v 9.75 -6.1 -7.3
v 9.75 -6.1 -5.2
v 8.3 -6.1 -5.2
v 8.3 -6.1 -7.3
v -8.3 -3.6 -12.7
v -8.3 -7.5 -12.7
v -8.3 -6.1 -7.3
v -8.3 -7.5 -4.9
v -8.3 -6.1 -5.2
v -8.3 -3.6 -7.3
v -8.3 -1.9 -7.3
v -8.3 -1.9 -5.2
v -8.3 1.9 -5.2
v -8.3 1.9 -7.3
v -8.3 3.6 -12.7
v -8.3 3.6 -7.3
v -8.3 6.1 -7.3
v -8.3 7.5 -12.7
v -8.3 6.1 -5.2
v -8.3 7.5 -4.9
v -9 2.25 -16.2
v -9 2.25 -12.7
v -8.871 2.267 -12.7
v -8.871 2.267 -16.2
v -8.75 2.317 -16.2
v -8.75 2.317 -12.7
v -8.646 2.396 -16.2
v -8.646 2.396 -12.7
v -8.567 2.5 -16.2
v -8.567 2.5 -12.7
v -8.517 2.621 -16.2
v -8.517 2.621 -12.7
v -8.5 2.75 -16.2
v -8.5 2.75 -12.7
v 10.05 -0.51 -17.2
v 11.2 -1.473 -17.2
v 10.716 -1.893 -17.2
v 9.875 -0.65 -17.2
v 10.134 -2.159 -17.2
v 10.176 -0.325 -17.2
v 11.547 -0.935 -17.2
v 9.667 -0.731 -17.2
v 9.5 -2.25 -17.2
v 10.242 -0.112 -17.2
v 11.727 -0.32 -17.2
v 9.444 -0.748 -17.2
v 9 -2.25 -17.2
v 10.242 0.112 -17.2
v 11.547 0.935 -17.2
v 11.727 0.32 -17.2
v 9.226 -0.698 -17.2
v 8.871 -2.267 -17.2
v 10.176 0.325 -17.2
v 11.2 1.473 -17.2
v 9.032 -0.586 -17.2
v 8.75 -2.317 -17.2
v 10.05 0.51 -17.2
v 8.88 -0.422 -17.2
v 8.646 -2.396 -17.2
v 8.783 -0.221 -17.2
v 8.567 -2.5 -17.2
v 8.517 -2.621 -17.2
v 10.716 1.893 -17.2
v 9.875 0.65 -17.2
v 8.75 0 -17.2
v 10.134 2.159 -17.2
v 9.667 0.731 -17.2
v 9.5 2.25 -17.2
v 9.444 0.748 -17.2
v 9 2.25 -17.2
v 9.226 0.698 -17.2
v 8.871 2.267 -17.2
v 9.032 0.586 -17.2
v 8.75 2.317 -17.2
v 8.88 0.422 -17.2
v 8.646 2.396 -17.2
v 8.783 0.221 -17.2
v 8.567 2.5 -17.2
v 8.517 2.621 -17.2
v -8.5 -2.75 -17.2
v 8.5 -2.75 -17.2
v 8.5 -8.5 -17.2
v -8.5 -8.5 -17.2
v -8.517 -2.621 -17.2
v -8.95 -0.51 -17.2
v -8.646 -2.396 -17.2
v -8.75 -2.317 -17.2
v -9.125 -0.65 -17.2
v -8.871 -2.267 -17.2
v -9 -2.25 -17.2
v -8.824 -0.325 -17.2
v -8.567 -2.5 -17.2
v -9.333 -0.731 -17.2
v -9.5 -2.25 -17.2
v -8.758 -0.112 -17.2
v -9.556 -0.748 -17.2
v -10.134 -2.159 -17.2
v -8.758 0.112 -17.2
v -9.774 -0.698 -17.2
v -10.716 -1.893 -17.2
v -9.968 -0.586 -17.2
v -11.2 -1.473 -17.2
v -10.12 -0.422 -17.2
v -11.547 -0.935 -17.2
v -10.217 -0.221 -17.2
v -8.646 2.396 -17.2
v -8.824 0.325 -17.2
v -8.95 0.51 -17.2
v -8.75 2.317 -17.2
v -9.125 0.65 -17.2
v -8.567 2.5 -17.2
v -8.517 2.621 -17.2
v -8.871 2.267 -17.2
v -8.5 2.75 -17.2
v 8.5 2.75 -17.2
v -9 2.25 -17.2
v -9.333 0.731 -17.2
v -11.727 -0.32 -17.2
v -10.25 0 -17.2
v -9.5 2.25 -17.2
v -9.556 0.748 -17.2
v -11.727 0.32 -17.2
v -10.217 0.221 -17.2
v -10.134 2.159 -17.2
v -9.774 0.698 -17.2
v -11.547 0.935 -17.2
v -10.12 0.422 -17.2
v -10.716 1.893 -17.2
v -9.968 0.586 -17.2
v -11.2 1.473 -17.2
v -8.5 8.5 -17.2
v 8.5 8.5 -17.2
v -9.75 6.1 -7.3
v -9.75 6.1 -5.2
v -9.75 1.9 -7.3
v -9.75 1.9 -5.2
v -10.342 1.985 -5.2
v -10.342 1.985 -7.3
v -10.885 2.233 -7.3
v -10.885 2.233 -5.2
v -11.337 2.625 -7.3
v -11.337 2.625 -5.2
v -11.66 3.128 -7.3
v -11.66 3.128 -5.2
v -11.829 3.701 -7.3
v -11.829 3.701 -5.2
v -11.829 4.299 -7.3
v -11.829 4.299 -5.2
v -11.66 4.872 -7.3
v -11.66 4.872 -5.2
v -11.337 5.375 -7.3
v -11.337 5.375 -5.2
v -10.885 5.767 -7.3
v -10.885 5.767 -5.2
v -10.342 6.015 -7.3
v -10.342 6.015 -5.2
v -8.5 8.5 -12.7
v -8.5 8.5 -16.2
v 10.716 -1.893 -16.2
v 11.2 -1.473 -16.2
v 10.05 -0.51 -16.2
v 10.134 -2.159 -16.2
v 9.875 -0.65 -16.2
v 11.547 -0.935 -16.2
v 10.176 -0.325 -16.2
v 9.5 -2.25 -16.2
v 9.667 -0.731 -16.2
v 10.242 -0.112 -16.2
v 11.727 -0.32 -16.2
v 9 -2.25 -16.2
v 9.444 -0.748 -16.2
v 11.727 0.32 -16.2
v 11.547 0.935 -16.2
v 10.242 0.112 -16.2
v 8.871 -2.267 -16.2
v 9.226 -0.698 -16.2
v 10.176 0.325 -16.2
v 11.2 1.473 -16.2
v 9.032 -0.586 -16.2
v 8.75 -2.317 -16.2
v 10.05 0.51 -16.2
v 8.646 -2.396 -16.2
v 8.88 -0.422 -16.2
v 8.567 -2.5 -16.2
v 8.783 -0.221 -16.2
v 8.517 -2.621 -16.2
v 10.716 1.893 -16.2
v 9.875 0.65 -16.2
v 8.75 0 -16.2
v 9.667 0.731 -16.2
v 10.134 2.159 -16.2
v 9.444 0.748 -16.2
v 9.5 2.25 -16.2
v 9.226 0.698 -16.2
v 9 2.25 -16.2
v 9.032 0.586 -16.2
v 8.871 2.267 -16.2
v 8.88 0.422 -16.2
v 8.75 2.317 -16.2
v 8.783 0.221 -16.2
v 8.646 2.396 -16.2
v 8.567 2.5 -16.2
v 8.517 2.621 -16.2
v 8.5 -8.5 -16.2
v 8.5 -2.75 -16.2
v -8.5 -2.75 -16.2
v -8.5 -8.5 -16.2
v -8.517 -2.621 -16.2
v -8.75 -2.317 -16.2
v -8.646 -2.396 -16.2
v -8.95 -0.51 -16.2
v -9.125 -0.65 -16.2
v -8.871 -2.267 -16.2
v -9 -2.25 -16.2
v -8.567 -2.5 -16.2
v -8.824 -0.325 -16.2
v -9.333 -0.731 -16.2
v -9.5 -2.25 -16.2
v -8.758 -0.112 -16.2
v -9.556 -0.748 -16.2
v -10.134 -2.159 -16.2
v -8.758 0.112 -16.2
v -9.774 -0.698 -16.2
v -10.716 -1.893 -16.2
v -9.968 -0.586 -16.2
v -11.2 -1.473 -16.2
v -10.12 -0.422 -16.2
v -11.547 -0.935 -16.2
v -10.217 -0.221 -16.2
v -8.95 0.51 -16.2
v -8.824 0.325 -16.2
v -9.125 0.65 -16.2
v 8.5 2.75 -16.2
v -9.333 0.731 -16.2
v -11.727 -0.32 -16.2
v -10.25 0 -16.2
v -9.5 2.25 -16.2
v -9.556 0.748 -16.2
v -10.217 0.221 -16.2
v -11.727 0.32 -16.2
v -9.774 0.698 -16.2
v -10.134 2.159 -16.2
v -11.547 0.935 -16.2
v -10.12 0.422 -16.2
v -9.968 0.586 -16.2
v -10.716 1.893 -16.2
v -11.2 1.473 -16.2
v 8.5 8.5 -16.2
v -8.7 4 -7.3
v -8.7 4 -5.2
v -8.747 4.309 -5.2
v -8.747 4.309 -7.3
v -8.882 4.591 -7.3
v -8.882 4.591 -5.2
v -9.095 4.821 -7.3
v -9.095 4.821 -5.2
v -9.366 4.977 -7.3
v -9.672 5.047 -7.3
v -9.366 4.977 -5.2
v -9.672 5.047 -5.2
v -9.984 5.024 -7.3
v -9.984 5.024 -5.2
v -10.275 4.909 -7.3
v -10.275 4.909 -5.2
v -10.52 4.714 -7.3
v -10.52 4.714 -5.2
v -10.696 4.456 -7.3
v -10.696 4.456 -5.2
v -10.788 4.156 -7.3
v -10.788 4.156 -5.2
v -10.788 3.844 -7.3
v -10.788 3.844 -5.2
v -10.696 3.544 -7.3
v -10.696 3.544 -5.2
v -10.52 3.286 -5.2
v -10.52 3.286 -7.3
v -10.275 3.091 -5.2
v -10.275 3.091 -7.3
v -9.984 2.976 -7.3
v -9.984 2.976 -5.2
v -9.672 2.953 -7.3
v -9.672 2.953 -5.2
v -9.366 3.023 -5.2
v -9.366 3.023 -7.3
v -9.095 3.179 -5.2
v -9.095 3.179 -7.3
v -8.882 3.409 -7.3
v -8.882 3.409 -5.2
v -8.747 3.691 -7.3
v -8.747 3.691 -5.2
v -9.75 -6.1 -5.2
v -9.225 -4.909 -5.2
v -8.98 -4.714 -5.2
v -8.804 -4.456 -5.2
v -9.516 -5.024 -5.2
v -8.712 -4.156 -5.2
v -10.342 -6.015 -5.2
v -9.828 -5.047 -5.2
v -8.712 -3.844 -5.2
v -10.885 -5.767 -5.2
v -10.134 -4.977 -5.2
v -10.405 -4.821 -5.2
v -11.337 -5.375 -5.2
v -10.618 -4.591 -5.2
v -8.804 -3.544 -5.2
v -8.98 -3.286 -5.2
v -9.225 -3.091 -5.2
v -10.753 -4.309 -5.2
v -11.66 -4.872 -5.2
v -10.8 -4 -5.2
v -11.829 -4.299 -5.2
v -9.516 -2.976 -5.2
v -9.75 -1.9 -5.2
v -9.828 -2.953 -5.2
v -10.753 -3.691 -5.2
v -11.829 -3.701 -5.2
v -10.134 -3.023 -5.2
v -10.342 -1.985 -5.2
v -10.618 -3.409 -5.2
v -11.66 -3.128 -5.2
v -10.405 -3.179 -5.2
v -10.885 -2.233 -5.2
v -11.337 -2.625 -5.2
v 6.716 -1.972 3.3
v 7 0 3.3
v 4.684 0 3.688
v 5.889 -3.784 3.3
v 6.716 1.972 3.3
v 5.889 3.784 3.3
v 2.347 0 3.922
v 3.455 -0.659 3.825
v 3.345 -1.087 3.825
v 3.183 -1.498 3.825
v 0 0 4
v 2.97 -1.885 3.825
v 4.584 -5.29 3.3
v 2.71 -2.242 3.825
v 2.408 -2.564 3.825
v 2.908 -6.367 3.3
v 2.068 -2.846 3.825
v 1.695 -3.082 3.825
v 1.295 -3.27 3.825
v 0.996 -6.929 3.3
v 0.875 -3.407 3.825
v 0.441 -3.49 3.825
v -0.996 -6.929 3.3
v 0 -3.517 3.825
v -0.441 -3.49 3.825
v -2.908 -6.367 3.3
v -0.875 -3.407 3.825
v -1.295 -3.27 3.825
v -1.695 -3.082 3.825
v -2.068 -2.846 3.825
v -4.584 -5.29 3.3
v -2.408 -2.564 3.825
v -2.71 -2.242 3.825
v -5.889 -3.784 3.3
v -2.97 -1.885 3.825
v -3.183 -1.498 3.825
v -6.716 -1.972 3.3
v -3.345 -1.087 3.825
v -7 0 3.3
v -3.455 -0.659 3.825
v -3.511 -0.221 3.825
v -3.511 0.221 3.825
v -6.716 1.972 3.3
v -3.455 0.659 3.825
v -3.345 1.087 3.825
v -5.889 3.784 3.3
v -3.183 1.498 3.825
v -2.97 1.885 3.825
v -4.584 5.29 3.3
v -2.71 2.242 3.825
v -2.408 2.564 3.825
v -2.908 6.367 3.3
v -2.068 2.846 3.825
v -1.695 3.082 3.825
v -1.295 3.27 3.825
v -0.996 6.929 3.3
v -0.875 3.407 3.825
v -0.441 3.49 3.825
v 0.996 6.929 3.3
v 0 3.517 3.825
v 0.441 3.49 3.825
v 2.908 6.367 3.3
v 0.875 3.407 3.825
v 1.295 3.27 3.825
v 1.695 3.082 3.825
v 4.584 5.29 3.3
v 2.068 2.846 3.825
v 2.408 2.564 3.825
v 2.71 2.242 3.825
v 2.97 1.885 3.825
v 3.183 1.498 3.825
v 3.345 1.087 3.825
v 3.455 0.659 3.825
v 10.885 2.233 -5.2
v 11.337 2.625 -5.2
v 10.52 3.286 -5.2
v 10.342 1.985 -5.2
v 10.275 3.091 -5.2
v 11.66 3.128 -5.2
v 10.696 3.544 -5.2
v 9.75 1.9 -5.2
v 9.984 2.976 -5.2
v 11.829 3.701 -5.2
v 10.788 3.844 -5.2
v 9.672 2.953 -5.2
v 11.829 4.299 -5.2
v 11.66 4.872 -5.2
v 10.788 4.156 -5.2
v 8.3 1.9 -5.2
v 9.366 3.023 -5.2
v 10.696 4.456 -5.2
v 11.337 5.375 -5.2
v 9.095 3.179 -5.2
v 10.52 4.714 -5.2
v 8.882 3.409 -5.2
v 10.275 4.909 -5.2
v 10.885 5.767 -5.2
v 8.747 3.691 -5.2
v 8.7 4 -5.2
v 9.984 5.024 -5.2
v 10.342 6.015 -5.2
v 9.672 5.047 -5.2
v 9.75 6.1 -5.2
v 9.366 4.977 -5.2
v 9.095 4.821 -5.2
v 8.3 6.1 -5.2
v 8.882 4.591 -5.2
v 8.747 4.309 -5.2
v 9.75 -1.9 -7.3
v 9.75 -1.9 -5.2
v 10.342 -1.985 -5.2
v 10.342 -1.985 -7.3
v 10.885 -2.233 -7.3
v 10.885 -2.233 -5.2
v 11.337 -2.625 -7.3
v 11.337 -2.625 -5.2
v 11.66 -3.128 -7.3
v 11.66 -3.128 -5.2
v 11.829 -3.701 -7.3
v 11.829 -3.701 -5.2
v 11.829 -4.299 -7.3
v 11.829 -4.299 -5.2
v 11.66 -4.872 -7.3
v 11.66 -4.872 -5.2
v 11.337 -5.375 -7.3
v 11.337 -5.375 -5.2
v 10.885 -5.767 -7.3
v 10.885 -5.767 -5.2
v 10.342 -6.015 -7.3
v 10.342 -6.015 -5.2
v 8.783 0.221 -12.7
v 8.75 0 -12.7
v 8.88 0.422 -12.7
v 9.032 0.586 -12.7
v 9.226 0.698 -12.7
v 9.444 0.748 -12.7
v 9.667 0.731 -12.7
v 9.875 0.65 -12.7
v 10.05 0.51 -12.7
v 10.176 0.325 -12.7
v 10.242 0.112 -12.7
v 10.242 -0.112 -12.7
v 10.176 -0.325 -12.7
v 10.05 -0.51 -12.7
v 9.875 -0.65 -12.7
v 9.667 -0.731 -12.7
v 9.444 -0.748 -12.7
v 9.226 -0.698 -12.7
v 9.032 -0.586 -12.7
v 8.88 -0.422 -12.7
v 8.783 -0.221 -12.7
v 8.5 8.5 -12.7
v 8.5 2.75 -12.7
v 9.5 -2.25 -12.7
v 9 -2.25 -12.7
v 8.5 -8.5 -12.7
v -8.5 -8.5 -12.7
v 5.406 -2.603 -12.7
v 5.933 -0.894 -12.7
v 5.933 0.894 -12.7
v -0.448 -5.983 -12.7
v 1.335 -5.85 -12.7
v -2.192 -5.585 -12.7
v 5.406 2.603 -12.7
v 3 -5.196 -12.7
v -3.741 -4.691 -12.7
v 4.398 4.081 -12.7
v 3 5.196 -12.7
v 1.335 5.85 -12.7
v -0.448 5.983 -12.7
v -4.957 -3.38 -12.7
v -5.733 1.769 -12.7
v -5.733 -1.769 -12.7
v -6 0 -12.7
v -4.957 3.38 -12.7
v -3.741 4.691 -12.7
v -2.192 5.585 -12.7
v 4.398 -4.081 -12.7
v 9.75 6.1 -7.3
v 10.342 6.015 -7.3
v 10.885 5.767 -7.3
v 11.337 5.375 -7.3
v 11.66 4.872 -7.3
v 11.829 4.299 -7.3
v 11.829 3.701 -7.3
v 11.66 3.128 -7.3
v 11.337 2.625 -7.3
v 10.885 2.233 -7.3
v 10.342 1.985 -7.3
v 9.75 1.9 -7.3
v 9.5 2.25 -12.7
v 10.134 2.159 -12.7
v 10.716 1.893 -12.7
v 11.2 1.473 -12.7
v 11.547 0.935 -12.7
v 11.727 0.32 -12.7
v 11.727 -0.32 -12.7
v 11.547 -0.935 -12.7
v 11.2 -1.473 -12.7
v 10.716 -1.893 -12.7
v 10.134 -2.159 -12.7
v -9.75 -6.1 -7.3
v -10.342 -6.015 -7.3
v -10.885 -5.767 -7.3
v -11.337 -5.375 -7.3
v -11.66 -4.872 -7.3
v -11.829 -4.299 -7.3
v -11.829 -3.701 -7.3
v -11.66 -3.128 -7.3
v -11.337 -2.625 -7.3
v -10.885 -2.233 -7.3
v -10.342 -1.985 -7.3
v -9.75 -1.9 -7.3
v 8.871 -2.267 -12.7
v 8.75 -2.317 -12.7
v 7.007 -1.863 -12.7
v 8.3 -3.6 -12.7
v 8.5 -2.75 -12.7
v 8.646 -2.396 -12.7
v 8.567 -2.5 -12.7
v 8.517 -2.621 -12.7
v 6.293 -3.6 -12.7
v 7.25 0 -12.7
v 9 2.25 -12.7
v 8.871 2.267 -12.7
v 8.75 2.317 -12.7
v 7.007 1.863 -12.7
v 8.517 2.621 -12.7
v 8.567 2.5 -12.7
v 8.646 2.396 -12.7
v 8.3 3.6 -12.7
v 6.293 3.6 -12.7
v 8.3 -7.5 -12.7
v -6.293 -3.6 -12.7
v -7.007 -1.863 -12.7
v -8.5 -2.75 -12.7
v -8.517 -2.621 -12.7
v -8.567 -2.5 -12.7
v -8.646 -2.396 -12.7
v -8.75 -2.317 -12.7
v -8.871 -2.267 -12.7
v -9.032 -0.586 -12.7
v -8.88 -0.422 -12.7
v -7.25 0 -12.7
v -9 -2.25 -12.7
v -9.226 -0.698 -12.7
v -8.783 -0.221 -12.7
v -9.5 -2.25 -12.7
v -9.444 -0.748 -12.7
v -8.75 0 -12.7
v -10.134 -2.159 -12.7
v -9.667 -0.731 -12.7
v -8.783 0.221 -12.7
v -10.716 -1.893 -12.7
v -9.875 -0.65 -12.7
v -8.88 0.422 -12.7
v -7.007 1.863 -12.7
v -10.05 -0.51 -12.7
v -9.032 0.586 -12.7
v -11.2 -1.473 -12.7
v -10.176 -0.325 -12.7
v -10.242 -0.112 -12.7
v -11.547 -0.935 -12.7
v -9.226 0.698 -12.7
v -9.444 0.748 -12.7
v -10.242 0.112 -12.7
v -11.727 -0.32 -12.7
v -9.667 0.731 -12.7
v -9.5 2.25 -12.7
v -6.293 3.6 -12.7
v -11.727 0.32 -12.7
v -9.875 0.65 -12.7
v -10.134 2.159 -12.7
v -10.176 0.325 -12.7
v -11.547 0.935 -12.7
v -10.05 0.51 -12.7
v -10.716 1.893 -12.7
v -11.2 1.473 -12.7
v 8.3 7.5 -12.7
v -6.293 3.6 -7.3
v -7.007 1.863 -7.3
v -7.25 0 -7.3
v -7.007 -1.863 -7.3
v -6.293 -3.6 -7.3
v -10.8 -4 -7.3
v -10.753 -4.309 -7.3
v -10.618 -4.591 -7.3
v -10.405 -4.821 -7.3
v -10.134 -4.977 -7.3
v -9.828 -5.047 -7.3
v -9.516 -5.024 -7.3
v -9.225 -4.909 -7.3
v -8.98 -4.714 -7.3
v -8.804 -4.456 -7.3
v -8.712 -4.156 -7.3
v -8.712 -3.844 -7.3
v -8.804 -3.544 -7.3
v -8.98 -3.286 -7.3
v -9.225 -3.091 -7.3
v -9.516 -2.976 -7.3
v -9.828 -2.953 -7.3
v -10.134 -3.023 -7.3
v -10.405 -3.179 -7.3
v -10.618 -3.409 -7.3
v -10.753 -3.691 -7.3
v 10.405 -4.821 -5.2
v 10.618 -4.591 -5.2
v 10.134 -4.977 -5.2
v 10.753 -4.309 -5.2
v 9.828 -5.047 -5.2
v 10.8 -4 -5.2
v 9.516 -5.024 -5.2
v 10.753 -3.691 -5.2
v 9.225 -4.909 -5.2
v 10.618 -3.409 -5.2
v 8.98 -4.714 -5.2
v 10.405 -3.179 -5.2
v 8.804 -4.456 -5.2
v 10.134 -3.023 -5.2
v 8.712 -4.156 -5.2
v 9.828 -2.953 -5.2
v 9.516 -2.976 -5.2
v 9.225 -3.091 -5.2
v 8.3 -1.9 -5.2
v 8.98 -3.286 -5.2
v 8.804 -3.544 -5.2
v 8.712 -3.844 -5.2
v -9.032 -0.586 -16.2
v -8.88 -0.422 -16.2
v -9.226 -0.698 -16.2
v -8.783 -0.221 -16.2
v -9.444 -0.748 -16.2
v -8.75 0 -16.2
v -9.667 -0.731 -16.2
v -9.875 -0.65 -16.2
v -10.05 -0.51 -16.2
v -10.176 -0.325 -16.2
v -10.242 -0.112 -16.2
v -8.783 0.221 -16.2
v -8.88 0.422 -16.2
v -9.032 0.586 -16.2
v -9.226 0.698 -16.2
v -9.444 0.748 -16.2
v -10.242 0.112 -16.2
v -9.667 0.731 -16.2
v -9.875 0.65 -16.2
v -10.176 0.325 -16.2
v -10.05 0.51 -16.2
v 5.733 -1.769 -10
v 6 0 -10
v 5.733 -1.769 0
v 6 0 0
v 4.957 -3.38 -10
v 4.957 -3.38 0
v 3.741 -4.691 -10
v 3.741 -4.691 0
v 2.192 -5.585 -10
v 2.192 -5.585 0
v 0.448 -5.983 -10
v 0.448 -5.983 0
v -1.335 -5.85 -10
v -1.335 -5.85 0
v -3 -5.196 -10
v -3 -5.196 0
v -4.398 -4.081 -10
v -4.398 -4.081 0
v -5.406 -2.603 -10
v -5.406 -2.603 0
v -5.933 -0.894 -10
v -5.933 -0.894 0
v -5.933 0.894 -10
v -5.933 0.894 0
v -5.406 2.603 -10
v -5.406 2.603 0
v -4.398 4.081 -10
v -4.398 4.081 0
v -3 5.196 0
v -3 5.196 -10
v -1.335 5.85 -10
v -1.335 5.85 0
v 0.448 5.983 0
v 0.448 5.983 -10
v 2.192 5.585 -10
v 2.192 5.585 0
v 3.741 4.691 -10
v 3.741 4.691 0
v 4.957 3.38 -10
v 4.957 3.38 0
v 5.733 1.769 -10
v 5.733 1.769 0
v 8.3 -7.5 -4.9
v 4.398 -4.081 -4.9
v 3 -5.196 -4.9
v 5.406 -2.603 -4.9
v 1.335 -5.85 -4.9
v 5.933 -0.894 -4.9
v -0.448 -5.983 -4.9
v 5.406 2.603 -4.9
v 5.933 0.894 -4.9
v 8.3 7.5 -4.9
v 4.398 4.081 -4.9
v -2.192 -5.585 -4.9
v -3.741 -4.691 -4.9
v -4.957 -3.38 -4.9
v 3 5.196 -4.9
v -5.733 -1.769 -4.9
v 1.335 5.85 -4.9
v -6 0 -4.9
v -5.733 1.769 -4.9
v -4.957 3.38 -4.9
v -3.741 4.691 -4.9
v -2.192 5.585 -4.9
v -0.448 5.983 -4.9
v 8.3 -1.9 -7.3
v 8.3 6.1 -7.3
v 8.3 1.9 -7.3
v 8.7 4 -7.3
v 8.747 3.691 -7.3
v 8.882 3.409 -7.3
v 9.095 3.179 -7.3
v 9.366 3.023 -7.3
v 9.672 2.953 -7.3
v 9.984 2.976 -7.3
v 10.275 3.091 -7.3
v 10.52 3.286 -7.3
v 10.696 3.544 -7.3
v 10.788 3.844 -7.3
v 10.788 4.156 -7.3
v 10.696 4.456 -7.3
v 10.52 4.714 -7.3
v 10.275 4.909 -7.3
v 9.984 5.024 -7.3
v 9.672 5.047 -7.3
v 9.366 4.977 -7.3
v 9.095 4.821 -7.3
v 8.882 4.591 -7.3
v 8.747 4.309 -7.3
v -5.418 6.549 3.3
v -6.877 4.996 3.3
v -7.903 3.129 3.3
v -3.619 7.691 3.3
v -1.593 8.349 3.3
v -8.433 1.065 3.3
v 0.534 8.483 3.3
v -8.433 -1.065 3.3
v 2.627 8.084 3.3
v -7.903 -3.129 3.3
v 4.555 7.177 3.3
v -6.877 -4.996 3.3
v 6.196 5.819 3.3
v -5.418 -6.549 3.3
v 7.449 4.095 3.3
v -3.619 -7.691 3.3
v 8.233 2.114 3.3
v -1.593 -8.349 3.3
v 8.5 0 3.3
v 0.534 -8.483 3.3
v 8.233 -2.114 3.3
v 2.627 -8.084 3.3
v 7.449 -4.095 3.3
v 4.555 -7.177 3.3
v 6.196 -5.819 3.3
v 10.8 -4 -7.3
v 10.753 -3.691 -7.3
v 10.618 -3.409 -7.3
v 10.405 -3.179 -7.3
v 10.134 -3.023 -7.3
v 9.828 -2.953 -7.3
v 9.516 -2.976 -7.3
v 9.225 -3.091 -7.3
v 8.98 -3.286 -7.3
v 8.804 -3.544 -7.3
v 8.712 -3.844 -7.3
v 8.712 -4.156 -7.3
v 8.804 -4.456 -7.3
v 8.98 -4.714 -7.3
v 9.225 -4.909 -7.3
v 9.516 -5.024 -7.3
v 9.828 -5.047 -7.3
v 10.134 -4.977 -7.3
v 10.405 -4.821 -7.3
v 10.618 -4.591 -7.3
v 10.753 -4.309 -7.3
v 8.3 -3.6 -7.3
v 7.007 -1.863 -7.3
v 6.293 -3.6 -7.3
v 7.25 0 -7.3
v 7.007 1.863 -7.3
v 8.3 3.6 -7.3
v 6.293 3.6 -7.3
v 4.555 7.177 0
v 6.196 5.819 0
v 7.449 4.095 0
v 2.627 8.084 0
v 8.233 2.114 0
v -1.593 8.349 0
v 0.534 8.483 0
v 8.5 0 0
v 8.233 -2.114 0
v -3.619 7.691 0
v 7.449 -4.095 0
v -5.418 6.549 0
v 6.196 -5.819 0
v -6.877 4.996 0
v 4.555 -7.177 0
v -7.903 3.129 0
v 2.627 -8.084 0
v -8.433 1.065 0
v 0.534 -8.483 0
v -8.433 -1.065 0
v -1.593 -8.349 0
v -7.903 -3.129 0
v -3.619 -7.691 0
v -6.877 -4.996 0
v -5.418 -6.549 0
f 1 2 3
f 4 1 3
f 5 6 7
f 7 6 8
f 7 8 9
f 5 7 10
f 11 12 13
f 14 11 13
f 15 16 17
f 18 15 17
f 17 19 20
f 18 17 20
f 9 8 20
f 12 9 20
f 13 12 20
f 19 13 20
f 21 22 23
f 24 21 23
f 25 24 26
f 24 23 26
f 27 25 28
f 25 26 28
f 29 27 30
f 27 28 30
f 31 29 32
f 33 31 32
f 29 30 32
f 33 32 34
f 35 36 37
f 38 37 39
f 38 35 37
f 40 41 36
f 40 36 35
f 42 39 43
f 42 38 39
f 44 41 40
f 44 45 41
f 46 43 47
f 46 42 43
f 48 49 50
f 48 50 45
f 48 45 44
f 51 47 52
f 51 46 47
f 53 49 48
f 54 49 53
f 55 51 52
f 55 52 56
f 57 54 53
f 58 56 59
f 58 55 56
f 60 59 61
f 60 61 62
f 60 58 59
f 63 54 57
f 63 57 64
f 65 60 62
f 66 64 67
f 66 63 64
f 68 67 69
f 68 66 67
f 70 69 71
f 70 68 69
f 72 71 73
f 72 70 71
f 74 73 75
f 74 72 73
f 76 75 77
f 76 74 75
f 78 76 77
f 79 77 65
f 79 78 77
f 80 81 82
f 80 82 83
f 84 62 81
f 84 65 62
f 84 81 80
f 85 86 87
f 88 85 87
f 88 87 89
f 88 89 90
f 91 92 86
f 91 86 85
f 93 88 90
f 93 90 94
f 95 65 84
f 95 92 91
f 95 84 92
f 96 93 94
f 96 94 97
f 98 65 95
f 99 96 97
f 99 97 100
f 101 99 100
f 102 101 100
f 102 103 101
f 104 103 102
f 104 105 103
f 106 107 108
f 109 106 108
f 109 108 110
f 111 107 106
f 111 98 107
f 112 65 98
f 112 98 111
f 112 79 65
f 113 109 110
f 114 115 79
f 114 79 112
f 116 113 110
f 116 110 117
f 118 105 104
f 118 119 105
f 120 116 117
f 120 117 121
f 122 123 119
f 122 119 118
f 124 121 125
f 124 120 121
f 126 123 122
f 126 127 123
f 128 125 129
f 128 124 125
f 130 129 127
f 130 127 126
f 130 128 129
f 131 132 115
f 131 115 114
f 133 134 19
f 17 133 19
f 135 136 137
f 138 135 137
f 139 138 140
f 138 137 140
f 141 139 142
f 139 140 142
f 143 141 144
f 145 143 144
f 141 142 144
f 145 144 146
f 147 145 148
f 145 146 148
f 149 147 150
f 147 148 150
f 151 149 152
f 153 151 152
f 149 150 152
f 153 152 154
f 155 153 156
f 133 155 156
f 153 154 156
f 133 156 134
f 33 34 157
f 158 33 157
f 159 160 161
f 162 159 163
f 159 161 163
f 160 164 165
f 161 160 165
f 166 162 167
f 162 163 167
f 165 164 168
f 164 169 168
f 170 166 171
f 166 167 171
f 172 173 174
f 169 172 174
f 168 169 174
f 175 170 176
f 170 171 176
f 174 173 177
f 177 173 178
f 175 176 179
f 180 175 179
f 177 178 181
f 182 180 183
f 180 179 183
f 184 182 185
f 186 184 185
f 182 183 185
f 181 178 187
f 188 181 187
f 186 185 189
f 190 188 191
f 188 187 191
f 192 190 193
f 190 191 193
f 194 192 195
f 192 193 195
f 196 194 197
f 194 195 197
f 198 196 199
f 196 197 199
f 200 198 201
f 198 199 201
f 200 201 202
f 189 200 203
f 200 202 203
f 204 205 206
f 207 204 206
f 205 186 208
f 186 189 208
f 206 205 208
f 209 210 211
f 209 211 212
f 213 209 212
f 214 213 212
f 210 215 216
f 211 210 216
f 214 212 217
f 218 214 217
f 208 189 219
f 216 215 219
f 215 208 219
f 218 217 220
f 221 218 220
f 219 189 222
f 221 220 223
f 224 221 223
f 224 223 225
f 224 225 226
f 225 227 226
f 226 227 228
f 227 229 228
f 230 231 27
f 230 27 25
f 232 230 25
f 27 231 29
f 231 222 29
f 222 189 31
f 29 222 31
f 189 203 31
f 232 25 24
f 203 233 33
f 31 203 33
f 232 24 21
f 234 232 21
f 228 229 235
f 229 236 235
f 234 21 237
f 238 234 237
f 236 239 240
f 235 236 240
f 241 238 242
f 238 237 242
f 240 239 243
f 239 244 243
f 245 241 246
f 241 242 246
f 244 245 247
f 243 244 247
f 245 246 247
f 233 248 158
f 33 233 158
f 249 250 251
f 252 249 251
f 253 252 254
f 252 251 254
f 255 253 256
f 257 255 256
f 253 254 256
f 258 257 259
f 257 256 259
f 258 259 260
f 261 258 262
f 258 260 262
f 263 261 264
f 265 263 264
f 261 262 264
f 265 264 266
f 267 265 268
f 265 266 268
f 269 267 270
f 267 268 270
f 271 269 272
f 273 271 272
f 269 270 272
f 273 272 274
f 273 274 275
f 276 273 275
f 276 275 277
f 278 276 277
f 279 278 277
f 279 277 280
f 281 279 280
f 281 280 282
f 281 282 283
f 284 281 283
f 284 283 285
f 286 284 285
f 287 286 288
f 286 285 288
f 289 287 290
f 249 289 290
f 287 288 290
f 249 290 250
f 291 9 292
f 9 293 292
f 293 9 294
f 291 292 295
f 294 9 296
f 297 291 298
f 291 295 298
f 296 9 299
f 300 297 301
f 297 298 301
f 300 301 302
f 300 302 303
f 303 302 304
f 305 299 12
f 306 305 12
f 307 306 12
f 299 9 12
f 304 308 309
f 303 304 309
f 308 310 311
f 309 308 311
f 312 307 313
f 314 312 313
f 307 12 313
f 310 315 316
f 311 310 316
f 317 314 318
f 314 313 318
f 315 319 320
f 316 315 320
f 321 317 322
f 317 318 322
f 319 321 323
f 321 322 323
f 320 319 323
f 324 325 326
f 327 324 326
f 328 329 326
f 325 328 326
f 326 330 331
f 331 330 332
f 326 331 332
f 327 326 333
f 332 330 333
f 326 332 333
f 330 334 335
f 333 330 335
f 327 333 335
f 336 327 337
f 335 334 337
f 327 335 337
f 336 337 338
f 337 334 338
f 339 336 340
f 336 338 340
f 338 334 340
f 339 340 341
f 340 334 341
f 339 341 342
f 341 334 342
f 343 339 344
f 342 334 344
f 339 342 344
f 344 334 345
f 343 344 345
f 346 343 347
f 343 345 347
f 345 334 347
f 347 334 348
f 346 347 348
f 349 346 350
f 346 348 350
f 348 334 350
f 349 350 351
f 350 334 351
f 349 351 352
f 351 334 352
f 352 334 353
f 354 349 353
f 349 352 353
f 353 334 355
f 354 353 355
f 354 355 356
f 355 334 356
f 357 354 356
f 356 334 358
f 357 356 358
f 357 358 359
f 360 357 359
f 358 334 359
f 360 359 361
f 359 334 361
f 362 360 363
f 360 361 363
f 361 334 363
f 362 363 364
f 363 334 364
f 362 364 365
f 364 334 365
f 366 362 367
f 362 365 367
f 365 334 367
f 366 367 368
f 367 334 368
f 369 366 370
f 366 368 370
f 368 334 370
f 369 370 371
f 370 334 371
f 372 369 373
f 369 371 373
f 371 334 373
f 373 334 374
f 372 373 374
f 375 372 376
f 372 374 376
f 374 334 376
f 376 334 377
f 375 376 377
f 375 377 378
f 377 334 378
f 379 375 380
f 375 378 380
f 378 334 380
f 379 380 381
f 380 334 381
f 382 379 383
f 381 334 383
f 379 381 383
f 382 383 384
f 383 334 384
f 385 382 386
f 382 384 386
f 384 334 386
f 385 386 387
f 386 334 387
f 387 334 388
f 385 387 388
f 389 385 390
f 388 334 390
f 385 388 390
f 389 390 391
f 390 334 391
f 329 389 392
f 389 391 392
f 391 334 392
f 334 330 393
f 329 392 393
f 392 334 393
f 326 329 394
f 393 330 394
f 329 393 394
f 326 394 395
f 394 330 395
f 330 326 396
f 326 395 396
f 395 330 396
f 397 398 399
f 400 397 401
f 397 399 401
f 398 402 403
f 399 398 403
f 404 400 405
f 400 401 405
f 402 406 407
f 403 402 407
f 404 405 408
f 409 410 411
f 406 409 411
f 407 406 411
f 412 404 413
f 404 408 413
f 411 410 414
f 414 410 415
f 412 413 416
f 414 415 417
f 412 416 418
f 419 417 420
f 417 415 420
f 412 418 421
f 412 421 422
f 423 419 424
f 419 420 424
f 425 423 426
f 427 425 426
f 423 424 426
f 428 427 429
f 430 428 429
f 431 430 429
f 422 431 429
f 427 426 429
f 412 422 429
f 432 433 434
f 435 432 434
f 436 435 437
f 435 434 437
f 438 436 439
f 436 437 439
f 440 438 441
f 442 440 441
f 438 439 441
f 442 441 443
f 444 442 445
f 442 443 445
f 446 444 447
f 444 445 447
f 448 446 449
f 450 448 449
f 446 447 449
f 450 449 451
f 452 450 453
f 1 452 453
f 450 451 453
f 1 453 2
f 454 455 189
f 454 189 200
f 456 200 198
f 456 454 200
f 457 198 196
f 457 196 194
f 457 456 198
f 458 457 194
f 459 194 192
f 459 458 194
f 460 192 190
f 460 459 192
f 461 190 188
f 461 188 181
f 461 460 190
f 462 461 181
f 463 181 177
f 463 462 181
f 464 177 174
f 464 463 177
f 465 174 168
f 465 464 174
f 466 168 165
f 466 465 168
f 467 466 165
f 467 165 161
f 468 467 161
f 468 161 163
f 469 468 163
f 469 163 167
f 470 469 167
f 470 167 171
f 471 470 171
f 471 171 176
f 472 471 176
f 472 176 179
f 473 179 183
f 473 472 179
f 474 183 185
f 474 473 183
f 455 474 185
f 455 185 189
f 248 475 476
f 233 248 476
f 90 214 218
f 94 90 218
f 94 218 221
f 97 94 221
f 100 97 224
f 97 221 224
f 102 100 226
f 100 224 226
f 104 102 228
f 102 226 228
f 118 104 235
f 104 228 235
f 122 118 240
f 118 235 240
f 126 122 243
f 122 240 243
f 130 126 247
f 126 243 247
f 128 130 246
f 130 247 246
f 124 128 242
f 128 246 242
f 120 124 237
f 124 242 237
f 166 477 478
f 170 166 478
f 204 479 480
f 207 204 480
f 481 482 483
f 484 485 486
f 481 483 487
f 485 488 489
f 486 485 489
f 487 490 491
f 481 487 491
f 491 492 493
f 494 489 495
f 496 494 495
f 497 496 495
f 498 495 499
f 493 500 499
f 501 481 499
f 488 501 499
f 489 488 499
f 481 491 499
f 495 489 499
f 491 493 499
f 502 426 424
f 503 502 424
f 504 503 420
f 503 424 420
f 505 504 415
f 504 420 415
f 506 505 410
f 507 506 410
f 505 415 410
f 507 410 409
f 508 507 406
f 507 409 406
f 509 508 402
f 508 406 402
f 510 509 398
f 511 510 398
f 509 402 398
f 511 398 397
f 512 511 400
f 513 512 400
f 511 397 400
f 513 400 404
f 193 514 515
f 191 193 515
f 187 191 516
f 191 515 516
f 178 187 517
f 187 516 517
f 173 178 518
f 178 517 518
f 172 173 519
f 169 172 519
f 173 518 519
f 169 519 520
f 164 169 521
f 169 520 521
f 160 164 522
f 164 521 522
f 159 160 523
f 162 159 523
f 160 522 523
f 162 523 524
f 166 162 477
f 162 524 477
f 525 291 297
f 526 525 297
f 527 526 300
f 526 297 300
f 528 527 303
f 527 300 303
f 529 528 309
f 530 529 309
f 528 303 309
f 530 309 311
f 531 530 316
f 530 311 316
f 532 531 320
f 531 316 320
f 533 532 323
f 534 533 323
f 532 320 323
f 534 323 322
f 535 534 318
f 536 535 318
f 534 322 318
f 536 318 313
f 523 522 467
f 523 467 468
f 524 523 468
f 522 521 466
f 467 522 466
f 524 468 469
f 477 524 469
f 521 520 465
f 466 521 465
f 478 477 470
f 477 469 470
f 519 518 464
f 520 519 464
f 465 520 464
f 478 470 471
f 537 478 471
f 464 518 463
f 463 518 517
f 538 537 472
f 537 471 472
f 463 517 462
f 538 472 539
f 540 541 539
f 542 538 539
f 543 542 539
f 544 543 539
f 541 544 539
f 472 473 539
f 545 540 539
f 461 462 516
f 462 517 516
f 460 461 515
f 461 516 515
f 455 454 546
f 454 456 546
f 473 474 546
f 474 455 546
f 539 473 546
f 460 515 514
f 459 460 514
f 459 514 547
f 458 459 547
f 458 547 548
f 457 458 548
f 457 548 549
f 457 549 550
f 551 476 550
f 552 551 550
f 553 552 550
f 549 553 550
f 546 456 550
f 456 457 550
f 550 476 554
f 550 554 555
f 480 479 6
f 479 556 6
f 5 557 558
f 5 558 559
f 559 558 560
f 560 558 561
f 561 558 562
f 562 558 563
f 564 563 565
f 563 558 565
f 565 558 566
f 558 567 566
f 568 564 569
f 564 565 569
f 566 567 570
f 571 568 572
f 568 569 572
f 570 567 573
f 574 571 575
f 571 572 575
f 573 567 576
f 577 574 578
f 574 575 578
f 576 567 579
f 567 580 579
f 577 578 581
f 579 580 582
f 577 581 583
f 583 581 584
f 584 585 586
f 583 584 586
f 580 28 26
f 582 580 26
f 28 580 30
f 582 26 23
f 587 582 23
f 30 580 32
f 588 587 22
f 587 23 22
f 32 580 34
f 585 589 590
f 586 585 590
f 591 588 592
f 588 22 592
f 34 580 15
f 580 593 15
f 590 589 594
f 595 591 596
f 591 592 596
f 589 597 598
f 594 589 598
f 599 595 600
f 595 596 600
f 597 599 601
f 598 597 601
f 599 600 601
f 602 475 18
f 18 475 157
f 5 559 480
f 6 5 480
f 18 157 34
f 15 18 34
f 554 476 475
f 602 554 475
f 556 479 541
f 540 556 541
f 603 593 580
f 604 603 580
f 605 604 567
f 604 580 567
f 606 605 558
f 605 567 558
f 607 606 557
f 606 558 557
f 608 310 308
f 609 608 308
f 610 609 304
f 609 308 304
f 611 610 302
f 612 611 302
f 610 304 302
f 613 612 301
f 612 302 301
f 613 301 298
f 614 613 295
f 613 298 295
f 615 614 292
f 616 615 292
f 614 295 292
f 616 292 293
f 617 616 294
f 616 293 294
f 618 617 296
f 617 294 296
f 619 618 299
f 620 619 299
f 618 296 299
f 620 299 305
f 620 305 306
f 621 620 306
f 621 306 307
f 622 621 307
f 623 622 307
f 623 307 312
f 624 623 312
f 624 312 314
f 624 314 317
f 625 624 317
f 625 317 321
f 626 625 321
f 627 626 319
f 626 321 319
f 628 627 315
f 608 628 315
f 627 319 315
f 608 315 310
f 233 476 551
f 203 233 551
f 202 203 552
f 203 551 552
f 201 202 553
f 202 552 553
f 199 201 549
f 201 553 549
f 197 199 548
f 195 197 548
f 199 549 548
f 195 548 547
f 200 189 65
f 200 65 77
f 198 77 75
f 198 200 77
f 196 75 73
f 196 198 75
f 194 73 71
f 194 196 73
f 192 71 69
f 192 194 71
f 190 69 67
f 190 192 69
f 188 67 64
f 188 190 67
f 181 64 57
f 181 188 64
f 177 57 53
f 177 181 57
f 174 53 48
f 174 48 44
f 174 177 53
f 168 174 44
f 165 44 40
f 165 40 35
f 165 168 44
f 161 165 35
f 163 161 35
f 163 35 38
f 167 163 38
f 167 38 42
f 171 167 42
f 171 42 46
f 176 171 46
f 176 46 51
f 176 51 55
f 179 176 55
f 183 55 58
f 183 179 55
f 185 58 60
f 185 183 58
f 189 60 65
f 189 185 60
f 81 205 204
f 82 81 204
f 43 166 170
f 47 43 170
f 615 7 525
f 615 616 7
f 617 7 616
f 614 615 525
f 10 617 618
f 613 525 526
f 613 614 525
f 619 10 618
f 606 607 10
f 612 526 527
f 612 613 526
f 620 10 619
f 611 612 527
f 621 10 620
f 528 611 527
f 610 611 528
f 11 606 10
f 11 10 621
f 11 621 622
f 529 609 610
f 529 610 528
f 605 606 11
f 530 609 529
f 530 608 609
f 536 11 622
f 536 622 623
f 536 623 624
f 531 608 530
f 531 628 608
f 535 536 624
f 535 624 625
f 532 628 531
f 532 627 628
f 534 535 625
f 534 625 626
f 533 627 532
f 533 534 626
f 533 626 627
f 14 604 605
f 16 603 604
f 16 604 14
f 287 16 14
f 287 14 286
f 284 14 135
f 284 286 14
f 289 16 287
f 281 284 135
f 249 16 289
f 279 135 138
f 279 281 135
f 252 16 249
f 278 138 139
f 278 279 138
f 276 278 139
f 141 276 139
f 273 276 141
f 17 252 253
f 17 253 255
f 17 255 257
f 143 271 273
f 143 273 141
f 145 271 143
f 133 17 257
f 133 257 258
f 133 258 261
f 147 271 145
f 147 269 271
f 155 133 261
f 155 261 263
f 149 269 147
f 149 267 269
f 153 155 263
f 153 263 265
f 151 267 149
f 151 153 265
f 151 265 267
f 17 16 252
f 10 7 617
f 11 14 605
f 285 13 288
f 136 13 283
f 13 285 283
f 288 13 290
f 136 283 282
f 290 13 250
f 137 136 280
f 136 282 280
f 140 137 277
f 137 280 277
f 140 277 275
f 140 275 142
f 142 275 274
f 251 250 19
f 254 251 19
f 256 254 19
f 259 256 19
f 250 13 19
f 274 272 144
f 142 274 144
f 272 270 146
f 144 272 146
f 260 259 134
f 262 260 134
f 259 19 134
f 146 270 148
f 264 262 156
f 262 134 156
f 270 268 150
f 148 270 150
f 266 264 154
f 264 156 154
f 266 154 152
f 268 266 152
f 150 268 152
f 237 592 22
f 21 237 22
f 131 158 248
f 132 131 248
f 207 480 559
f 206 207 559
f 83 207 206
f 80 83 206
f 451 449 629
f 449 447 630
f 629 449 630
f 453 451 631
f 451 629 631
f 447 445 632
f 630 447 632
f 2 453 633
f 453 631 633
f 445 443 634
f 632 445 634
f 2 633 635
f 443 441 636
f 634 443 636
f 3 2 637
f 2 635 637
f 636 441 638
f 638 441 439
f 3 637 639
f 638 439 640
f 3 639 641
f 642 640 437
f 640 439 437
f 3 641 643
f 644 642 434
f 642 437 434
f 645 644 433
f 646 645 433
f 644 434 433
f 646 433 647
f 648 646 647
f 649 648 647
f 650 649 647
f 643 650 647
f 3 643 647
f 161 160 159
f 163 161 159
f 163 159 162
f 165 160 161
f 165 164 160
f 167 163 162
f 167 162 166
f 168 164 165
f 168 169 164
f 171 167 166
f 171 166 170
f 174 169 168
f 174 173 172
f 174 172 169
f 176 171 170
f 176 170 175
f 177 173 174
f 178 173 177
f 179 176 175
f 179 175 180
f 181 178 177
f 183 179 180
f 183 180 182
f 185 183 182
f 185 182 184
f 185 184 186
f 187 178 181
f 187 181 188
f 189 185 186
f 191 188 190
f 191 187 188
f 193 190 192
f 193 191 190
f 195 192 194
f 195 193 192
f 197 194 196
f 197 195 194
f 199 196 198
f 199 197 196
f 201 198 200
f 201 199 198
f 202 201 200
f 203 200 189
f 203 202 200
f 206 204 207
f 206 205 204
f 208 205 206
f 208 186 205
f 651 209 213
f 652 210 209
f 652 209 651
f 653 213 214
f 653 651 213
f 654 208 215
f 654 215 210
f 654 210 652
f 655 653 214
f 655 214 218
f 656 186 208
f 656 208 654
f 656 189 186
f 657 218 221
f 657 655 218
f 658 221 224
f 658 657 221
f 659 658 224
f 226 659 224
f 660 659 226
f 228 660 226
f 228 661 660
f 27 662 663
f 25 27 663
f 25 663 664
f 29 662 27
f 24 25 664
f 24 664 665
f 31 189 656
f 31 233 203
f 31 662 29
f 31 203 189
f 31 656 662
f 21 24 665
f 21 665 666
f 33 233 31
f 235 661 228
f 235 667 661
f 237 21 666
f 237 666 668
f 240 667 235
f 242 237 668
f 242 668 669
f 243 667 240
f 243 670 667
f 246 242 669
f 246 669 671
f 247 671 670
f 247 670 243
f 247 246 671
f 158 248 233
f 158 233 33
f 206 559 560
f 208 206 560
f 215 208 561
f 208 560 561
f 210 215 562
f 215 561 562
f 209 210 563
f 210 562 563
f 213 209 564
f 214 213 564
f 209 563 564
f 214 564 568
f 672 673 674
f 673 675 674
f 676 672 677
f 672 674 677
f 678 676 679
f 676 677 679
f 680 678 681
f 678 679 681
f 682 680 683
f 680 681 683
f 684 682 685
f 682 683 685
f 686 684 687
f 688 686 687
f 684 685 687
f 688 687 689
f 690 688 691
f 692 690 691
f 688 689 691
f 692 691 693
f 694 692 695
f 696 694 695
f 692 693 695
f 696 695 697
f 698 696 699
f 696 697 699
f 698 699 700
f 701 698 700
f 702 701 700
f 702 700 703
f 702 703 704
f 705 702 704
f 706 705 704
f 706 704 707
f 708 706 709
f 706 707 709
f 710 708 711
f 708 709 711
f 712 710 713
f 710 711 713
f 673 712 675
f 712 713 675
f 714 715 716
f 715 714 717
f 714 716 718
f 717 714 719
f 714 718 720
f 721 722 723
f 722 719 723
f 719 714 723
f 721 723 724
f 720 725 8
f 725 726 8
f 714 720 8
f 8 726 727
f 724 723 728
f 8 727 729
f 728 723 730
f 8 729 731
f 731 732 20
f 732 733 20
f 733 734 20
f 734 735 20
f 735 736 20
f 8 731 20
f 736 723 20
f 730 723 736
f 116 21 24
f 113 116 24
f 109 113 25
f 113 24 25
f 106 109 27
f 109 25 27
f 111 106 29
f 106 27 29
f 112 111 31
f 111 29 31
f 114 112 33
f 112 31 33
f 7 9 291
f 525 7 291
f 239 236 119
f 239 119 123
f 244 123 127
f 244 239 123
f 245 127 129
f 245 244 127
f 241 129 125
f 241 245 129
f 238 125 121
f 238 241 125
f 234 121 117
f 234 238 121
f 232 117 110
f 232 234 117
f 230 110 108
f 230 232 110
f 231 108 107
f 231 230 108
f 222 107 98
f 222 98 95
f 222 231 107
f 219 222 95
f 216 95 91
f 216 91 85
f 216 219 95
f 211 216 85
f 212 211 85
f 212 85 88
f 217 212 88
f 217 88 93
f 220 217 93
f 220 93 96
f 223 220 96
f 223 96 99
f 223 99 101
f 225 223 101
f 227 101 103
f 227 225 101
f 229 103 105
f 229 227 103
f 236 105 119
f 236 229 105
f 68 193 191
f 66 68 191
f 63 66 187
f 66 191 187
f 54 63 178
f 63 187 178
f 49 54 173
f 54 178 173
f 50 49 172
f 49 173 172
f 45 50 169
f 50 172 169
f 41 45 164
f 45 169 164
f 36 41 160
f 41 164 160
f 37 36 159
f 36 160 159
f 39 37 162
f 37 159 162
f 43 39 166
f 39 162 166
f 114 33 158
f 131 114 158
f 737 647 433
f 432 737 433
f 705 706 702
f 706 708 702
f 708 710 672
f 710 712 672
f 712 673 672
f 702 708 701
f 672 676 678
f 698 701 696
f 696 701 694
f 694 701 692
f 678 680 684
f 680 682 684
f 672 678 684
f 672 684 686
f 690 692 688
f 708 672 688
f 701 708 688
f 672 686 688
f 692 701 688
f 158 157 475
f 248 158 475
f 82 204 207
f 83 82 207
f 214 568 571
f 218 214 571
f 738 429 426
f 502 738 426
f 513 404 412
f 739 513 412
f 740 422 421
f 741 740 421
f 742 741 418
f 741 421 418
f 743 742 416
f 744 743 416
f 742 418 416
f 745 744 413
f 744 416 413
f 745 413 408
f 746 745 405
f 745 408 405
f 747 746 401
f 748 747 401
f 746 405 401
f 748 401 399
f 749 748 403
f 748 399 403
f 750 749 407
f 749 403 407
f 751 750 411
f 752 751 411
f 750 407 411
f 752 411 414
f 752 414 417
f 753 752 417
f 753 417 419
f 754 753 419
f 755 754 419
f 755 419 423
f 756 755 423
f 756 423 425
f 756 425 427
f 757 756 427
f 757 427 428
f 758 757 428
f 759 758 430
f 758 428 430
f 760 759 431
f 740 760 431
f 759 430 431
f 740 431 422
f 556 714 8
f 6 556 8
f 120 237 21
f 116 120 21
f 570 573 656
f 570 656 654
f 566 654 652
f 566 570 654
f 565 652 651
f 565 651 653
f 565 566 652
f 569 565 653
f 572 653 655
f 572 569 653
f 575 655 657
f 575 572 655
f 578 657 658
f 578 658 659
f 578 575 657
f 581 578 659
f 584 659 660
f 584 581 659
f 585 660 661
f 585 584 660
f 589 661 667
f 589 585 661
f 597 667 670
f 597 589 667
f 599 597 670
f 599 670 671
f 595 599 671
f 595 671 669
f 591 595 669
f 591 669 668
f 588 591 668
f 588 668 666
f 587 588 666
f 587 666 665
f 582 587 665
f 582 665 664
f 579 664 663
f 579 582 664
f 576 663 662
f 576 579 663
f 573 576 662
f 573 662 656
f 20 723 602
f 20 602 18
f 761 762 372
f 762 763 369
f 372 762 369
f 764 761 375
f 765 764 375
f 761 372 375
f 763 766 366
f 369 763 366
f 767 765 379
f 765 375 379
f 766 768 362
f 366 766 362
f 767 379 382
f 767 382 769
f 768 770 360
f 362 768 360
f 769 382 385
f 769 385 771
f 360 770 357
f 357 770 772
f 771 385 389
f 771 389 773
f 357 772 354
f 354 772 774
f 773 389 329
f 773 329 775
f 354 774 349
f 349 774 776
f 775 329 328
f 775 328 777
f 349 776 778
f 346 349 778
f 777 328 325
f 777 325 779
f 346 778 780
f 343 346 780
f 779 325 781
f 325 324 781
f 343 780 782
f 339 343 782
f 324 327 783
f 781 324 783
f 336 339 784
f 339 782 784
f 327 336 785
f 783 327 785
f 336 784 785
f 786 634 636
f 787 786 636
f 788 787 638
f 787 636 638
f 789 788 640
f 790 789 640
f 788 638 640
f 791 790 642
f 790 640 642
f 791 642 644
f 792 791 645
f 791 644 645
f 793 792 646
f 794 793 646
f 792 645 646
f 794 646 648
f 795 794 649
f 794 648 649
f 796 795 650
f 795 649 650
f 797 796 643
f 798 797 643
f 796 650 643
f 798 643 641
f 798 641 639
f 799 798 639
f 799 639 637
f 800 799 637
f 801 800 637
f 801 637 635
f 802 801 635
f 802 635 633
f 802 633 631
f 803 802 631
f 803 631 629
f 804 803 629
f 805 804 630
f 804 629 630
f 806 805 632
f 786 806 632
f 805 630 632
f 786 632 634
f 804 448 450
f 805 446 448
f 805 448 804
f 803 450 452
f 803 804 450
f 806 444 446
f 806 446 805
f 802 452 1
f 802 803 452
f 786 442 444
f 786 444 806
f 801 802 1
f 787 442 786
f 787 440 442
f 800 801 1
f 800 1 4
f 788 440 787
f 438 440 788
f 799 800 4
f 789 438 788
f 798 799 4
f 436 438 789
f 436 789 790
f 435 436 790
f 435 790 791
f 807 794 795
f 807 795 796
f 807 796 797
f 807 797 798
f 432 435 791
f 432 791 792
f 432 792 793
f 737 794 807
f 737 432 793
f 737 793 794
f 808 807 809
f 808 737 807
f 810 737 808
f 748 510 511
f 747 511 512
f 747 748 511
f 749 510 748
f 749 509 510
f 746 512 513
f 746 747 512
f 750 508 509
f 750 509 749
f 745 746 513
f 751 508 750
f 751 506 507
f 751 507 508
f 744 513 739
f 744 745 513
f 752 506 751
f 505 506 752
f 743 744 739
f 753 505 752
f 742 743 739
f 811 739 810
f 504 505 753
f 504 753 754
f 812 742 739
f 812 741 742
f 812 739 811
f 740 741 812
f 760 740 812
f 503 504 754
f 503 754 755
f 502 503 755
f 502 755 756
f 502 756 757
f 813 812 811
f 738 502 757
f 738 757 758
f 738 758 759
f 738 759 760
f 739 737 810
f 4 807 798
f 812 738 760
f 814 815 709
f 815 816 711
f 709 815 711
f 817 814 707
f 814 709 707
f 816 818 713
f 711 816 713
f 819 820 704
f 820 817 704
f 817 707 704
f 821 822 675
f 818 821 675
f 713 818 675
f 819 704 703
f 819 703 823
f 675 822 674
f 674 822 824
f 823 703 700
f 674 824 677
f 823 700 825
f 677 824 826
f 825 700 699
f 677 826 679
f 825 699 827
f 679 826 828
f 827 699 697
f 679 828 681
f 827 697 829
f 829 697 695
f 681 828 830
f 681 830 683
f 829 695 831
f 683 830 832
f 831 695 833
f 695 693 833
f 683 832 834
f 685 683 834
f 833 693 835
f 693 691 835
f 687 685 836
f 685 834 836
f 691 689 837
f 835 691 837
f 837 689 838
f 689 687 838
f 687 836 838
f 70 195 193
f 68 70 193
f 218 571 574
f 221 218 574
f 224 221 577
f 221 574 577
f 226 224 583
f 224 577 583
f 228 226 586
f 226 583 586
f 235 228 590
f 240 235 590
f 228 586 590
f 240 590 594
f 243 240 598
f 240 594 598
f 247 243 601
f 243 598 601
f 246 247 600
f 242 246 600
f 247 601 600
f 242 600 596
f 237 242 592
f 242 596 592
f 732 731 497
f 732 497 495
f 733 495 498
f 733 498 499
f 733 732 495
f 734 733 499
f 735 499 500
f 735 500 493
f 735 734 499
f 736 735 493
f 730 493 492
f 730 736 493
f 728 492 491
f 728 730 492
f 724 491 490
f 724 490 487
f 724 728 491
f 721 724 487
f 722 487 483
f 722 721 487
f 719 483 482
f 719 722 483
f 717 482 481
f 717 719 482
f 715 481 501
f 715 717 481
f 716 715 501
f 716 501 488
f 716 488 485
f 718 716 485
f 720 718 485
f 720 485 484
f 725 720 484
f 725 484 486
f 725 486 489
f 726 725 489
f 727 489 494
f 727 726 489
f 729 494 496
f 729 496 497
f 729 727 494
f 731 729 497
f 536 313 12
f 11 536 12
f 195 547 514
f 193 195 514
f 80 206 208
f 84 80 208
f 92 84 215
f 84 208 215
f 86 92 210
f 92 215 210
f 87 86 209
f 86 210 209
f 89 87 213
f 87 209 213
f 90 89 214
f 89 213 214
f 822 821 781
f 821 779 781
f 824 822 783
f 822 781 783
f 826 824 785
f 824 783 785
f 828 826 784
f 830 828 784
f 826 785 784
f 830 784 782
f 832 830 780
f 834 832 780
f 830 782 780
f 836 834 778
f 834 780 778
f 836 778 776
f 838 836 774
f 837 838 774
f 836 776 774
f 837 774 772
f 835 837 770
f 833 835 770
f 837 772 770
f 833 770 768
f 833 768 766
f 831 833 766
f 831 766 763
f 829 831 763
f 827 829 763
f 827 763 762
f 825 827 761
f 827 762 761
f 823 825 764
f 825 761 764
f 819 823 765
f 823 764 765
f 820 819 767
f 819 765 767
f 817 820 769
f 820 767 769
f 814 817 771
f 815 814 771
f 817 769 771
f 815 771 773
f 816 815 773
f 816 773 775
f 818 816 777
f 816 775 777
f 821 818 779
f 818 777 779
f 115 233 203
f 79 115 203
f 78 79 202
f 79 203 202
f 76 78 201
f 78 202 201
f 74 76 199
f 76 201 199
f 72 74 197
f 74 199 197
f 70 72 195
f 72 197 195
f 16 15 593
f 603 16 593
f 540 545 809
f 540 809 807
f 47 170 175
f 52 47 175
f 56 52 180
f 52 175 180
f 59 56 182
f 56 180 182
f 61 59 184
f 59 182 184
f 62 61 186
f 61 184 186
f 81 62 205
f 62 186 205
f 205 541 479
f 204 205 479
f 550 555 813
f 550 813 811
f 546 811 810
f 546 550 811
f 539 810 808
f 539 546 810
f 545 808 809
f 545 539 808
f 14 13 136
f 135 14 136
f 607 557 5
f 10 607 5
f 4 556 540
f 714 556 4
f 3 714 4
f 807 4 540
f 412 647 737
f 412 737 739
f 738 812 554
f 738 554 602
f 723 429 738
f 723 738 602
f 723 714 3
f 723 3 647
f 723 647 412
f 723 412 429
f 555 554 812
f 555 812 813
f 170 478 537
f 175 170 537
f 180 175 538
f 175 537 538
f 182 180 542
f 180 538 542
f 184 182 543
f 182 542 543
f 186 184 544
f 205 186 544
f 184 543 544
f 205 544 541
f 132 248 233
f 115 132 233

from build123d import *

# Parameters (mm, degrees)
EXTRUDE_START       = -5.1
SKETCH_2_W          = 16.6
SKETCH_2_H          = 15
SKETCH_2_R          = 6
EXTRUDE_1_DEPTH     = 7.8
EXTRUDE_START_2     = -0.3
SKETCH_3_R          = 1.05
EXTRUDE_2_DEPTH     = 2.1
SKETCH_4_R          = 0.75
EXTRUDE_3_DEPTH     = 3.5
SKETCH_5_R          = 0.75
EXTRUDE_4_DEPTH     = 1
CUT_EXTRUDE_1_DEPTH = 5.4


with BuildPart() as part:
    # Эскиз1 → Повернуть1 (revolve)
    with BuildSketch(Plane(origin=(0, 0, 0), x_dir=(0, 0, -1), z_dir=(1, 0, 0)), mode=Mode.PRIVATE) as revolve_1_sk:
        with BuildLine():
            Line((10, 6), (0, 6))
            Line((0, 6), (0, 8.5))
            Line((0, 8.5), (-3.3, 8.5))
            Line((-3.3, 8.5), (-3.3, 7))
            ThreePointArc((-3.3, 7), (-3.824564674, 3.517456467), (-4, 0))
            Line((-4, 0), (0, 0))
            Line((0, 0), (10, 0))
            Line((10, 0), (10, 6))
        make_face()
    revolve(revolve_1_sk.sketch.rotate(Axis((0, 0, 4), (0, 0, -1)), 90), axis=Axis((0, 0, 4), (0, 0, -1)))


with BuildPart() as body_2:
    # Эскиз2 → Бобышка-Вытянуть1 (new body)
    with BuildSketch(Plane(origin=(0, 0, -10), x_dir=(-1, 0, 0), z_dir=(0, 0, -1)).offset(EXTRUDE_START)):
        Rectangle(SKETCH_2_W, SKETCH_2_H)
        Circle(SKETCH_2_R, mode=Mode.SUBTRACT)
    extrude(amount=EXTRUDE_1_DEPTH)

    # Эскиз3 → Бобышка-Вытянуть2 (add)
    # profile 1 of 4: a face of its own
    with BuildSketch(Plane.XY.offset(-4.9).offset(EXTRUDE_START_2)):
        with BuildLine():
            Line((-9.75, 6.1), (-8.3, 6.1))
            Line((-8.3, 6.1), (-8.3, 1.9))
            Line((-8.3, 1.9), (-9.75, 1.9))
            ThreePointArc((-9.75, 1.9), (-11.85, 4), (-9.75, 6.1))
        make_face()
        with Locations((-9.75, 4)):
            Circle(SKETCH_3_R, mode=Mode.SUBTRACT)
    # profile 2 of 4: a face of its own
    with BuildSketch(Plane.XY.offset(-4.9).offset(EXTRUDE_START_2)):
        with BuildLine():
            Line((9.75, 1.9), (8.3, 1.9))
            Line((8.3, 1.9), (8.3, 6.1))
            Line((8.3, 6.1), (9.75, 6.1))
            ThreePointArc((9.75, 6.1), (11.85, 4), (9.75, 1.9))
        make_face()
        with Locations(Location((9.75, 4, 0), (0, 0, 180))):
            Circle(SKETCH_3_R, mode=Mode.SUBTRACT)
    # profile 3 of 4: a face of its own
    with BuildSketch(Plane.XY.offset(-4.9).offset(EXTRUDE_START_2)):
        with BuildLine():
            Line((9.75, -6.1), (8.3, -6.1))
            Line((8.3, -6.1), (8.3, -1.9))
            Line((8.3, -1.9), (9.75, -1.9))
            ThreePointArc((9.75, -1.9), (11.85, -4), (9.75, -6.1))
        make_face()
        with Locations((9.75, -4)):
            Circle(SKETCH_3_R, mode=Mode.SUBTRACT)
    # profile 4 of 4: a face of its own
    with BuildSketch(Plane.XY.offset(-4.9).offset(EXTRUDE_START_2)):
        with BuildLine():
            Line((-9.75, -1.9), (-8.3, -1.9))
            Line((-8.3, -1.9), (-8.3, -6.1))
            Line((-8.3, -6.1), (-9.75, -6.1))
            ThreePointArc((-9.75, -6.1), (-11.85, -4), (-9.75, -1.9))
        make_face()
        with Locations(Location((-9.75, -4, 0), (0, 0, 180))):
            Circle(SKETCH_3_R, mode=Mode.SUBTRACT)
    extrude(amount=-EXTRUDE_2_DEPTH)

    # Эскиз4 → Бобышка-Вытянуть3 (add)
    with BuildSketch(Plane(origin=(0, 0, -12.7), x_dir=(-1, 0, 0), z_dir=(0, 0, -1))):
        with BuildLine():
            Line((-8.5, -8.5), (8.5, -8.5))
            Line((8.5, -8.5), (8.5, -2.75))
            ThreePointArc((8.5, -2.75), (8.646446609, -2.396446609), (9, -2.25))
            Line((9, -2.25), (9.5, -2.25))
            ThreePointArc((9.5, -2.25), (11.75, 0), (9.5, 2.25))
            Line((9.5, 2.25), (9, 2.25))
            ThreePointArc((9, 2.25), (8.646446609, 2.396446609), (8.5, 2.75))
            Line((8.5, 2.75), (8.5, 8.5))
            Line((8.5, 8.5), (-8.5, 8.5))
            Line((-8.5, 8.5), (-8.5, 2.75))
            ThreePointArc((-8.5, 2.75), (-8.646446609, 2.396446609), (-9, 2.25))
            Line((-9, 2.25), (-9.5, 2.25))
            ThreePointArc((-9.5, 2.25), (-11.75, 0), (-9.5, -2.25))
            Line((-9.5, -2.25), (-9, -2.25))
            ThreePointArc((-9, -2.25), (-8.646446609, -2.396446609), (-8.5, -2.75))
            Line((-8.5, -2.75), (-8.5, -8.5))
        make_face()
        with Locations((-9.5, 0)):
            Circle(SKETCH_4_R, mode=Mode.SUBTRACT)
        with Locations(Location((9.5, 0, 0), (0, 0, 180))):
            Circle(SKETCH_4_R, mode=Mode.SUBTRACT)
    extrude(amount=EXTRUDE_3_DEPTH)

    # Эскиз7 → Вырез-Вытянуть1 (cut)
    with BuildSketch(Plane.XY.offset(-12.7)):
        with BuildLine():
            Line((-8.3, -3.6), (-8.3, 3.6))
            Line((-8.3, 3.6), (-6.293051724, 3.6))
            ThreePointArc((-6.293051724, 3.6), (-7.25, 0), (-6.293051724, -3.6))
            Line((-6.293051724, -3.6), (-8.3, -3.6))
        make_face()
        with BuildLine():
            Line((8.3, 3.6), (6.293051724, 3.6))
            ThreePointArc((6.293051724, 3.6), (7.25, 0), (6.293051724, -3.6))
            Line((6.293051724, -3.6), (8.3, -3.6))
            Line((8.3, -3.6), (8.3, 3.6))
        make_face()
    extrude(amount=CUT_EXTRUDE_1_DEPTH, mode=Mode.SUBTRACT)


with BuildPart() as body_3:
    # Эскиз5 → Бобышка-Вытянуть4 (new body)
    with BuildSketch(Plane(origin=(0, 0, -16.2), x_dir=(-1, 0, 0), z_dir=(0, 0, -1))):
        with BuildLine():
            Line((8.5, 2.75), (8.5, 8.5))
            Line((8.5, 8.5), (-8.5, 8.5))
            Line((-8.5, 8.5), (-8.5, 2.75))
            ThreePointArc((-8.5, 2.75), (-8.646446609, 2.396446609), (-9, 2.25))
            Line((-9, 2.25), (-9.5, 2.25))
            ThreePointArc((-9.5, 2.25), (-11.75, 0), (-9.5, -2.25))
            Line((-9.5, -2.25), (-9, -2.25))
            ThreePointArc((-9, -2.25), (-8.646446609, -2.396446609), (-8.5, -2.75))
            Line((-8.5, -2.75), (-8.5, -8.5))
            Line((-8.5, -8.5), (8.5, -8.5))
            Line((8.5, -8.5), (8.5, -2.75))
            ThreePointArc((8.5, -2.75), (8.646446609, -2.396446609), (9, -2.25))
            Line((9, -2.25), (9.5, -2.25))
            ThreePointArc((9.5, -2.25), (11.75, 0), (9.5, 2.25))
            Line((9.5, 2.25), (9, 2.25))
            ThreePointArc((9, 2.25), (8.646446609, 2.396446609), (8.5, 2.75))
        make_face()
        with Locations((9.5, 0)):
            Circle(SKETCH_5_R, mode=Mode.SUBTRACT)
        with Locations((-9.5, 0)):
            Circle(SKETCH_5_R, mode=Mode.SUBTRACT)
    extrude(amount=EXTRUDE_4_DEPTH)


solid = Compound([part.part, body_2.part, body_3.part])
